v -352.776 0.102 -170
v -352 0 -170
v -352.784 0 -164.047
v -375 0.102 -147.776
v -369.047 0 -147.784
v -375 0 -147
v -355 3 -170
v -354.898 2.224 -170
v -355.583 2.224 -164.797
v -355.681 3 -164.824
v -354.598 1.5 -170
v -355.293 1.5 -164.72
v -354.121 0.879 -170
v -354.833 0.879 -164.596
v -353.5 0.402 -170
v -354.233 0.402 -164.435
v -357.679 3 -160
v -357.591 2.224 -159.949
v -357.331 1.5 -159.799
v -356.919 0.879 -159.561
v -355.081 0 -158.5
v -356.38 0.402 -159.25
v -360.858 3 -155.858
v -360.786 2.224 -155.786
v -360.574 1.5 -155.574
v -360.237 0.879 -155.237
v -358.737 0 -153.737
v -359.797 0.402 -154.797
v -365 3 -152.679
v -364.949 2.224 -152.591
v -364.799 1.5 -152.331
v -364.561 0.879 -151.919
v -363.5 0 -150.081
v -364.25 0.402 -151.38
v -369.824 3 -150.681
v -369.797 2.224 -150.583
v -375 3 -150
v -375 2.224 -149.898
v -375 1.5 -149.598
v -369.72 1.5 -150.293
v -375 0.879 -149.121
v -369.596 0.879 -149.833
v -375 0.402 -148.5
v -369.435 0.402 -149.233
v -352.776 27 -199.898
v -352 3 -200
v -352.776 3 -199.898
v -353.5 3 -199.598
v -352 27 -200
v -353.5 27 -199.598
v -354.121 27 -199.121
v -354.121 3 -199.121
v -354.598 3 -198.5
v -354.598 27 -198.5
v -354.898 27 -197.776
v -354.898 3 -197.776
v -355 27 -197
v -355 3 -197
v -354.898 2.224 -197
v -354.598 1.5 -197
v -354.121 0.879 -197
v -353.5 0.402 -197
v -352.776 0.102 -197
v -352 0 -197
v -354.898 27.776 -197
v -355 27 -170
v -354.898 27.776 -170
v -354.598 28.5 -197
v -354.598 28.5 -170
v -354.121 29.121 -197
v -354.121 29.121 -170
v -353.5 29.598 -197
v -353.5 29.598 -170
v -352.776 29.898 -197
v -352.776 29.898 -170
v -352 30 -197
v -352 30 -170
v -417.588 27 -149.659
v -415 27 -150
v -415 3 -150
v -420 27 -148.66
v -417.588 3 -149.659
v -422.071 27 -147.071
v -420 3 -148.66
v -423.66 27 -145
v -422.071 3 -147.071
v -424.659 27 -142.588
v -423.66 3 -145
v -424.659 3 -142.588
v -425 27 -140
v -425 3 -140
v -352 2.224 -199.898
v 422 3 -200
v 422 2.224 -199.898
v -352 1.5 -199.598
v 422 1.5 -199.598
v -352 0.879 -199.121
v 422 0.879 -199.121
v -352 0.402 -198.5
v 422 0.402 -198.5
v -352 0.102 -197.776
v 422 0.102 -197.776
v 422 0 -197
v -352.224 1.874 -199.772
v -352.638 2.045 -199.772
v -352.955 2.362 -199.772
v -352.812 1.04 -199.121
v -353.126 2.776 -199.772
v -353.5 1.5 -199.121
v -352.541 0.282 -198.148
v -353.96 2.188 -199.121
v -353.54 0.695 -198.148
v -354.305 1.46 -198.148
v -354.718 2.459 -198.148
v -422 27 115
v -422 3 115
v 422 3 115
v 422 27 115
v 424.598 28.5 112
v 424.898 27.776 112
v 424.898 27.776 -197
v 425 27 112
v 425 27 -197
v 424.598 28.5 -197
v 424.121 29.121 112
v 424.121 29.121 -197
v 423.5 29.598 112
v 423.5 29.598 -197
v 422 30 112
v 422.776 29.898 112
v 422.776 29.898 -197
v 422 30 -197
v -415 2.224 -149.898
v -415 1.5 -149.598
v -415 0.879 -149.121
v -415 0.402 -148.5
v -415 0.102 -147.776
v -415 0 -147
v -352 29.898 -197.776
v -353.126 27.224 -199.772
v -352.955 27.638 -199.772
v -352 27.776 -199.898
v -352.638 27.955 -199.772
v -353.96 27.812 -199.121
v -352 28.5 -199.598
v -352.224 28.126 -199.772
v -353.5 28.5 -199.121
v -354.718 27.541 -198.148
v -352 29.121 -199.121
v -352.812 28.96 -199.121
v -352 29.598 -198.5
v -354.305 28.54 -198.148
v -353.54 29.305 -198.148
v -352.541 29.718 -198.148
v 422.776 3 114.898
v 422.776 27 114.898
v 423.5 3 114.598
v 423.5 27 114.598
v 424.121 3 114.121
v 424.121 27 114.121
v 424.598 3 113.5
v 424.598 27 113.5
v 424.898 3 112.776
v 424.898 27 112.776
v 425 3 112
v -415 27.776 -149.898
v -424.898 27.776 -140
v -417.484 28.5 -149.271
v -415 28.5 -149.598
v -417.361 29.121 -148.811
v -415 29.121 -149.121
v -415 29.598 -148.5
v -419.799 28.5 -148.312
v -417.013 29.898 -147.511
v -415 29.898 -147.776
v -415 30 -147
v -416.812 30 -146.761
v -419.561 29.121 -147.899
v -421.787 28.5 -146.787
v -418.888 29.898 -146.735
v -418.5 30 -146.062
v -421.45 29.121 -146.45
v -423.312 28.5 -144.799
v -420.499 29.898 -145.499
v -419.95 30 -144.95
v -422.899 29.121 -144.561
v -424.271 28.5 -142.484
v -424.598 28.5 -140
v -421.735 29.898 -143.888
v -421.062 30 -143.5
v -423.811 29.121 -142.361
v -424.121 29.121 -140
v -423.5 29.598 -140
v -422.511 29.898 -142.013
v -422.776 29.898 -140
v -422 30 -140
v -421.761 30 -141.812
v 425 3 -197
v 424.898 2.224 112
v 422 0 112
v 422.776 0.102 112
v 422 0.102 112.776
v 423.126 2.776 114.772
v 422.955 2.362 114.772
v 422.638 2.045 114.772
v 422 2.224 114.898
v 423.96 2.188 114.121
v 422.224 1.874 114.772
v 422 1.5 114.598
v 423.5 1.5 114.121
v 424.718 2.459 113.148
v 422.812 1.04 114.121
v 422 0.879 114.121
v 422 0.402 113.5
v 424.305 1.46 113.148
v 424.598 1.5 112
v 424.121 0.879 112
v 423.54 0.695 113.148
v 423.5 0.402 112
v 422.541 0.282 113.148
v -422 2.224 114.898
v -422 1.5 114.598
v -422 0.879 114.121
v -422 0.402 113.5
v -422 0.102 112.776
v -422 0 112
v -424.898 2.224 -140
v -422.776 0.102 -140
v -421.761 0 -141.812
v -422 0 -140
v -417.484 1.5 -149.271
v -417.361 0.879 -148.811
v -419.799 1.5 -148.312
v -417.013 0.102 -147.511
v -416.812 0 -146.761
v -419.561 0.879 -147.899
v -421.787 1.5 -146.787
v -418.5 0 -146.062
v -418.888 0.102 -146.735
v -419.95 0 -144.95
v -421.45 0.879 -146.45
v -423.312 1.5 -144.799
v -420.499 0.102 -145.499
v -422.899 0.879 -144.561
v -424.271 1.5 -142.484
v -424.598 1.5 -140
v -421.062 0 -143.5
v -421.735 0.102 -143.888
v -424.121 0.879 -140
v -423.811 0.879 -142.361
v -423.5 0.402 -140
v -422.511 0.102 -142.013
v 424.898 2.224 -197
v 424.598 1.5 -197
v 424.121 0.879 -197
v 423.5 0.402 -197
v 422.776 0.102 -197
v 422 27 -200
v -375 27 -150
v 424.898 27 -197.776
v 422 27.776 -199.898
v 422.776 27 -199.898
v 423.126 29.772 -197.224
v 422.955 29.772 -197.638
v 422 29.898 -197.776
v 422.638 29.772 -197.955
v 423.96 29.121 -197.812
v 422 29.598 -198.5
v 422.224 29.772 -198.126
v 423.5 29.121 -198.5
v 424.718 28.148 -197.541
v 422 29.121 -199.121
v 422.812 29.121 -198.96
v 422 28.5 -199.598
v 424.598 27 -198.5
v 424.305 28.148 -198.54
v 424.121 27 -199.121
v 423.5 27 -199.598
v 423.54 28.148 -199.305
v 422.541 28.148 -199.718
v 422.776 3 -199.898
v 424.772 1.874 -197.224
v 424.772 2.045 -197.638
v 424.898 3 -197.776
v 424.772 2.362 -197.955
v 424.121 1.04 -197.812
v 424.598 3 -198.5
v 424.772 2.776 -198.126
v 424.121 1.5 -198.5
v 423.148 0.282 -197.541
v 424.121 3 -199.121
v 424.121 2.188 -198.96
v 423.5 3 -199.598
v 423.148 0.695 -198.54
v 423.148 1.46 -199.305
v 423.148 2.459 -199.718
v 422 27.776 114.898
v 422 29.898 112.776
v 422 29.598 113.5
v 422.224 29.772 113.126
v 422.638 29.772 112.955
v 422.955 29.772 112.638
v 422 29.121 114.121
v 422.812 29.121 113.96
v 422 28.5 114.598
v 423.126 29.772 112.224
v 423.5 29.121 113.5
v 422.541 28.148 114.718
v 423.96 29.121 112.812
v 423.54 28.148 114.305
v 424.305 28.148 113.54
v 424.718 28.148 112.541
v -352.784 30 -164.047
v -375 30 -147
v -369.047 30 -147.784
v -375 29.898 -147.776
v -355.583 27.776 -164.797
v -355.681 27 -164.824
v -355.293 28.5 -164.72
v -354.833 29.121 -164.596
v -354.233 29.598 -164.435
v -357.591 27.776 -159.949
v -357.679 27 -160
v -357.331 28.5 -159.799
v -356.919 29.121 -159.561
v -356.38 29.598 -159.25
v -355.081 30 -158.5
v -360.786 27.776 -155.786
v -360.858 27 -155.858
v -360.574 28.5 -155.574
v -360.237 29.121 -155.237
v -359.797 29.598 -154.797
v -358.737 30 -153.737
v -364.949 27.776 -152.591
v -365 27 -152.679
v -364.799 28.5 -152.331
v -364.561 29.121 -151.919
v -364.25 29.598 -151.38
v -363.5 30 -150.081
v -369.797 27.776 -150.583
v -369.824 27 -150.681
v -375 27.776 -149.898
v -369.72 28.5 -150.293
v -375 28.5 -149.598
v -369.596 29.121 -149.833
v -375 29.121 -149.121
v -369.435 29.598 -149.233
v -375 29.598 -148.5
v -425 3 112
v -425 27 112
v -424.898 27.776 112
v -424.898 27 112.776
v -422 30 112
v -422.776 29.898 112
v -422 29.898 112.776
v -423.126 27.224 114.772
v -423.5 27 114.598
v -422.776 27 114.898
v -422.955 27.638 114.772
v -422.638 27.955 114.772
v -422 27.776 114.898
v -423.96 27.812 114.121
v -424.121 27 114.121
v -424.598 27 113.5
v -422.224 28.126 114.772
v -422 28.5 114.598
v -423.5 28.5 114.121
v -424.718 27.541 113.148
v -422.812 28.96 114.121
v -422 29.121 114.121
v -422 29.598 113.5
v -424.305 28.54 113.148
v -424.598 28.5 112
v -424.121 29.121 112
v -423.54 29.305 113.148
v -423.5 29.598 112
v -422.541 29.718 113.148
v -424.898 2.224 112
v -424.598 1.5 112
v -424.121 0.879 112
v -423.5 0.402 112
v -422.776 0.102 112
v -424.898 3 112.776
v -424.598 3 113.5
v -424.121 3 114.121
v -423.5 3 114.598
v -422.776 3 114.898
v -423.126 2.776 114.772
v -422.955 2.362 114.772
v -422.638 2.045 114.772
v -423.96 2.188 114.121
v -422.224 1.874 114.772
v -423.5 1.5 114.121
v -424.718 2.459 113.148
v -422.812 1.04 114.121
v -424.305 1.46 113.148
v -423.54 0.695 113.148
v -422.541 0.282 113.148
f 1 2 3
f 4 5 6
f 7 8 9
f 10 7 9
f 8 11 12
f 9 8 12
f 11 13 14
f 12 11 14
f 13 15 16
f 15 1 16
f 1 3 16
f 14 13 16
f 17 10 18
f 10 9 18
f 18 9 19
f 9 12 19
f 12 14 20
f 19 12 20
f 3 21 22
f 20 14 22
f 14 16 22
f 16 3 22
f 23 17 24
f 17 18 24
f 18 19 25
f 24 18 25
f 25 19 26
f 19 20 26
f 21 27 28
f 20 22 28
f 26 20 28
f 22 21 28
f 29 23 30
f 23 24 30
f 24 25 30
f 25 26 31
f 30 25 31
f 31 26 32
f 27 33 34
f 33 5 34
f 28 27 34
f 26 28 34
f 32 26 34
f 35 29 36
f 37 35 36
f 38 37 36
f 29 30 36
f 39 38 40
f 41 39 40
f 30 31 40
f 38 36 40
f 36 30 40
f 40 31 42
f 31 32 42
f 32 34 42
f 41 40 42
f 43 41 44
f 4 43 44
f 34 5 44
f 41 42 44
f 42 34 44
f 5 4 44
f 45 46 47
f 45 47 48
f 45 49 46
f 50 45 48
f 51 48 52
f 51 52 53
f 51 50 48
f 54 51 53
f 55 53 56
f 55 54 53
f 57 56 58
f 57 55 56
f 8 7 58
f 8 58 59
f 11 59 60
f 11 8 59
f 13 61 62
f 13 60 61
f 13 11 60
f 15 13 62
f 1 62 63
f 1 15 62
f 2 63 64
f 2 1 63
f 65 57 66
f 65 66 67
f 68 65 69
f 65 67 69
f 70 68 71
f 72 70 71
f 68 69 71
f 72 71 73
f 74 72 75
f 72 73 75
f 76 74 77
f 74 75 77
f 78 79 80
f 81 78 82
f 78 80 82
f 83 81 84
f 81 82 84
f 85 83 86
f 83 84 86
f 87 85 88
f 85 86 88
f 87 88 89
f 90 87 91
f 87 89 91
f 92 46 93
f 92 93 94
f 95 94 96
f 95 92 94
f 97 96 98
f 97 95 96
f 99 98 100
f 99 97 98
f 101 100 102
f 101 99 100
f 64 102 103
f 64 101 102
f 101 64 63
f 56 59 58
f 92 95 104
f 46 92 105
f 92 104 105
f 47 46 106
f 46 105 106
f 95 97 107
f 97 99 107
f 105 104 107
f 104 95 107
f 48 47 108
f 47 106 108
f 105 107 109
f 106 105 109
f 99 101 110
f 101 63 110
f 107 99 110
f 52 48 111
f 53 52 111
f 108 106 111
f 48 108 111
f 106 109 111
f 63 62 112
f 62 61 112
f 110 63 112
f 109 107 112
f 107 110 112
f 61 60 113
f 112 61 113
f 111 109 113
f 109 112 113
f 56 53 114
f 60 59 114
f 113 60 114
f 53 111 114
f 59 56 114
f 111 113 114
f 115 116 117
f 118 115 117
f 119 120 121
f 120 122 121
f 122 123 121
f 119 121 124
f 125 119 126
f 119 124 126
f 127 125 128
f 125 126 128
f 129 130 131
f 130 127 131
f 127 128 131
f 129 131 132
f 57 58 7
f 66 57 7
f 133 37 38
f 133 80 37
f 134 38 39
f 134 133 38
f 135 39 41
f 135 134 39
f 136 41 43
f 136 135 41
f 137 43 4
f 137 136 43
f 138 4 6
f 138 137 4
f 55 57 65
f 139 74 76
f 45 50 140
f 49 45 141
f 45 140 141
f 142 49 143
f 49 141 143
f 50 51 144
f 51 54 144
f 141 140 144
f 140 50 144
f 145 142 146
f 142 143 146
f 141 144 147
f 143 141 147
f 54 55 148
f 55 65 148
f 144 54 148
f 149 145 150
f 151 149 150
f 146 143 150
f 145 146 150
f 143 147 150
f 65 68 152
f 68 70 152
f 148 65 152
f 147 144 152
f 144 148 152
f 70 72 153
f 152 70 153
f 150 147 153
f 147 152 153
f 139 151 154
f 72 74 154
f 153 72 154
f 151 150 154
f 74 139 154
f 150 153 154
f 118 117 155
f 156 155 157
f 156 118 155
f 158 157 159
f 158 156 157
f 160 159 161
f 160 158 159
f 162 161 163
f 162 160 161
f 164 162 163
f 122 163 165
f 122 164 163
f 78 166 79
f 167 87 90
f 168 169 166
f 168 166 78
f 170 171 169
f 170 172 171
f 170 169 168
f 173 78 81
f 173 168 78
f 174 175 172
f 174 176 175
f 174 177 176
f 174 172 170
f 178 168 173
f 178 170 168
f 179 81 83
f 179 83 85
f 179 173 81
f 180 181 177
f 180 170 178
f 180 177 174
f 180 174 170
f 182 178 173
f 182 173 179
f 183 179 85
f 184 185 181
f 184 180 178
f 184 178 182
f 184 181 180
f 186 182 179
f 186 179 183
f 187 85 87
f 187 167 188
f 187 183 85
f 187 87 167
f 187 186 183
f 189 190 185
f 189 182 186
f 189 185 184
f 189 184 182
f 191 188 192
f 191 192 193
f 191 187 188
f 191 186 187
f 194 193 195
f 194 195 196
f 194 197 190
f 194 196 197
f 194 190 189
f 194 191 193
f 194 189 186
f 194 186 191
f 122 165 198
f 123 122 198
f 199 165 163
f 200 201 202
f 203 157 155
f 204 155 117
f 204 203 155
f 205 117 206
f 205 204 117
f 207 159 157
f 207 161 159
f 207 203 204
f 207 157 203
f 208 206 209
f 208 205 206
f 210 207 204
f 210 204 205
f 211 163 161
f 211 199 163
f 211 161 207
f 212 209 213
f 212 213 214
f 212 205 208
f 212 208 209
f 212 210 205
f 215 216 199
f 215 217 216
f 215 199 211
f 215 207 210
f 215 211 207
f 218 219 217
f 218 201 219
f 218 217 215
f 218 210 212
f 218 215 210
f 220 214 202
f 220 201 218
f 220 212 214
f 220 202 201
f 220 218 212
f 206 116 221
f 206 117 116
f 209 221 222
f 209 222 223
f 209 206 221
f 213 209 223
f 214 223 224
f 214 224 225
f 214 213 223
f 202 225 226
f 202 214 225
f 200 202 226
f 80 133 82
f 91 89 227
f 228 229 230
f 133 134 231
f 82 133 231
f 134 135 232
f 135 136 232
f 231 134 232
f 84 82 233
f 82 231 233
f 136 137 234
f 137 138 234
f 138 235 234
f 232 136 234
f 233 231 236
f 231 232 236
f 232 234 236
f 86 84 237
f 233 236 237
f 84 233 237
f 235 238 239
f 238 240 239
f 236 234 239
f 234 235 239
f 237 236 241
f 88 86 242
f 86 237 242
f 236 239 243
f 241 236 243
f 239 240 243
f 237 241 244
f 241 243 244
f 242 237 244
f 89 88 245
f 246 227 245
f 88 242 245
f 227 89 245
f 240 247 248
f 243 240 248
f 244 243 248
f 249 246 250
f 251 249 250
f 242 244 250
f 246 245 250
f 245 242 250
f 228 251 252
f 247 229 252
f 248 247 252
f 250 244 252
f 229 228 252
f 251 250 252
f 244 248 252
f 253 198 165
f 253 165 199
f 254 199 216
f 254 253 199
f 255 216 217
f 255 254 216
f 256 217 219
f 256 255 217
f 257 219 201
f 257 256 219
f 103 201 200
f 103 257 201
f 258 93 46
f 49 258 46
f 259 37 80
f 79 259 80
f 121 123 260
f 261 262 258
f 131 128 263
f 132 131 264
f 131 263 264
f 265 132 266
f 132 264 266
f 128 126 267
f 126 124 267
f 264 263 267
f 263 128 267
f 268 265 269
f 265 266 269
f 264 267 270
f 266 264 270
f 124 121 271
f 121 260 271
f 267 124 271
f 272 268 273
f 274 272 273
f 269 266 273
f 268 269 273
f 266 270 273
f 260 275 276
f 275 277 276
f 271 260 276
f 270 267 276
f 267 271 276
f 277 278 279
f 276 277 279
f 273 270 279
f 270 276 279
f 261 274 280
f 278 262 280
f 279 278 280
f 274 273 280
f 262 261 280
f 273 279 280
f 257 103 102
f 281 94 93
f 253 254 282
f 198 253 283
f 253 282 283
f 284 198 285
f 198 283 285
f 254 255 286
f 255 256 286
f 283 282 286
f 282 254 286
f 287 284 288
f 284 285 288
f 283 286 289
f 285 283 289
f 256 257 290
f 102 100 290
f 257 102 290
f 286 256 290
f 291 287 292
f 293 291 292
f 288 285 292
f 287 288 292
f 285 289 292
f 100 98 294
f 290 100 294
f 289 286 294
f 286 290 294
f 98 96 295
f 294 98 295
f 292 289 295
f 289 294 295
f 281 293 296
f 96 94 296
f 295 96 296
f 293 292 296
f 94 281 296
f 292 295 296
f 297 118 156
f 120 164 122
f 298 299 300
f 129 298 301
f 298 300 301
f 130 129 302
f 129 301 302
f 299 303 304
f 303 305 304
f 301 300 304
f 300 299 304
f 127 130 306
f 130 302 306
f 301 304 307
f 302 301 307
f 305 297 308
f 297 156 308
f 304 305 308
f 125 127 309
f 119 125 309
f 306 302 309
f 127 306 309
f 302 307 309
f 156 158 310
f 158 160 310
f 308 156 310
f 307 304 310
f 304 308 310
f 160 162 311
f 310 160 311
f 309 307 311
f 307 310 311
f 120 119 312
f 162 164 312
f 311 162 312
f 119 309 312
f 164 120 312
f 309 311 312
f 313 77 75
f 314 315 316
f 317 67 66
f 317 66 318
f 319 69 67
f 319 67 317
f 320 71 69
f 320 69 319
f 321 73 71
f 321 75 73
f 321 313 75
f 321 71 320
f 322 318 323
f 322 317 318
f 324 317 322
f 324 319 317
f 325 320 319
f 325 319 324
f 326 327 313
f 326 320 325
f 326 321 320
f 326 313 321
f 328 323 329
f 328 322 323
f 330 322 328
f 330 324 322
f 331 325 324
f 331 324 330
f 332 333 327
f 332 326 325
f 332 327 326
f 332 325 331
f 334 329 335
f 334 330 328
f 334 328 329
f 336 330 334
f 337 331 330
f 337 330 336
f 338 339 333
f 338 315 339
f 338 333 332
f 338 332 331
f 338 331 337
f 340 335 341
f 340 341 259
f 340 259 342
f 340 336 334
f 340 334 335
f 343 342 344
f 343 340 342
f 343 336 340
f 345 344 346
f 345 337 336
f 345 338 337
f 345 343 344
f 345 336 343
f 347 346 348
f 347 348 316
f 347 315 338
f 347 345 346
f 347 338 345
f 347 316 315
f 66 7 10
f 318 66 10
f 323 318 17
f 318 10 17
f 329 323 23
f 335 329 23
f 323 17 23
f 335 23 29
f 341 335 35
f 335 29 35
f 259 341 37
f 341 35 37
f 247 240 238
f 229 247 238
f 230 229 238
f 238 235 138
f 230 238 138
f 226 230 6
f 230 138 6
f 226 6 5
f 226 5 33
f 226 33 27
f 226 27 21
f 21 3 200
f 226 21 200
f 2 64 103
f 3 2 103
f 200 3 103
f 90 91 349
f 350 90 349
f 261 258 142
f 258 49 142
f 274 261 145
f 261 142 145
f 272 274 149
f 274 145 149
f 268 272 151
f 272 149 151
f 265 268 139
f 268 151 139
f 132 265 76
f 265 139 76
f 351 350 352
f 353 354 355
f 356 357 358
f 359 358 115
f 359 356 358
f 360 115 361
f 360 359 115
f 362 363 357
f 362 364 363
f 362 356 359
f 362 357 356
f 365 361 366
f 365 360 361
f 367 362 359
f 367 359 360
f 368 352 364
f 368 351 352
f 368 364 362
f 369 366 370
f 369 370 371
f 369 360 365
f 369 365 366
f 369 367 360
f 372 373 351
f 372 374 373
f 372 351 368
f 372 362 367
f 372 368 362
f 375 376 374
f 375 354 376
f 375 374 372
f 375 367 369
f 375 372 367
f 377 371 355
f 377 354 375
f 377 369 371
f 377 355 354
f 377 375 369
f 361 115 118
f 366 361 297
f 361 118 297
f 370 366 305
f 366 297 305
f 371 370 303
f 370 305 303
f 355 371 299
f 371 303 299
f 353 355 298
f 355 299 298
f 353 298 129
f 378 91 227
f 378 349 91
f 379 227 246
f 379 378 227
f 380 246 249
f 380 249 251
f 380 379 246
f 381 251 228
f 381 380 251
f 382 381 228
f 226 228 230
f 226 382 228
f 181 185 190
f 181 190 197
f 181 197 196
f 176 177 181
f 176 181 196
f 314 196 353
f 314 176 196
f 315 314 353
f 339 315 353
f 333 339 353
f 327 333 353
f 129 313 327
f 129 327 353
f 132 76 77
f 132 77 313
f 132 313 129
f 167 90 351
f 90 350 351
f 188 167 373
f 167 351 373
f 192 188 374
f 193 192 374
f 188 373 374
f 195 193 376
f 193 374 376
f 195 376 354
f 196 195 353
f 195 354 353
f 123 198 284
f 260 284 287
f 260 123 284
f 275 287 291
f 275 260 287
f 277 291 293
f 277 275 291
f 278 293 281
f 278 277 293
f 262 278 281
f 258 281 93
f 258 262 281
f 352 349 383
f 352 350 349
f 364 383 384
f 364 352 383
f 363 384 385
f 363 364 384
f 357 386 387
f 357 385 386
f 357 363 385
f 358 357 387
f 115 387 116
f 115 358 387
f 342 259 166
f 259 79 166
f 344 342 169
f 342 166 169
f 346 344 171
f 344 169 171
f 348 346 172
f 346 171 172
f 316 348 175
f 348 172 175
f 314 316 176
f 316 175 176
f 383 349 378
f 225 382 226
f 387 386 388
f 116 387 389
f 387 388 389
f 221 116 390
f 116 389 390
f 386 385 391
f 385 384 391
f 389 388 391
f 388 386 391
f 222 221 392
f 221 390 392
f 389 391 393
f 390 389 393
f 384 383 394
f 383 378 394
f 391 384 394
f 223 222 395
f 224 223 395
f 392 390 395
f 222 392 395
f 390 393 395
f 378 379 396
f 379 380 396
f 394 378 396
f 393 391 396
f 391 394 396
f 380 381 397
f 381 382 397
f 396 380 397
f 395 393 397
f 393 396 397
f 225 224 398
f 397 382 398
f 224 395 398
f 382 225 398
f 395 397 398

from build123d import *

# Parameters (mm, degrees)
EXTRUDE_1_DEPTH = 30
FILLET_2_R      = 3


with BuildPart() as part:
    # 草图1 → 凸台-拉伸1 (new body)
    with BuildSketch(Plane(origin=(0, 0, 0), x_dir=(1, 0, 0), z_dir=(0, 1, 0))):
        with BuildLine():
            Line((-425, 140), (-425, -115))
            Line((-425, -115), (425, -115))
            Line((425, -115), (425, 200))
            Line((425, 200), (-355, 200))
            Line((-355, 200), (-355, 170))
            ThreePointArc((-355, 170), (-360.857864376, 155.857864376), (-375, 150))
            Line((-375, 150), (-415, 150))
            ThreePointArc((-415, 150), (-422.071067812, 147.071067812), (-425, 140))
        make_face()
    extrude(amount=EXTRUDE_1_DEPTH)

    # 圆角2
    fillet_2_edges = [part.edges().sort_by_distance(p)[0] for p in [
        (-360.857864376, 0, -155.857864376),
        (-355, 0, -185),
        (35, 0, -200),
        (425, 0, -42.5),
        (-355, 30, -185),
        (425, 15, 115),
        (-425, 15, 115),
        (-355, 15, -200),
        (425, 15, -200),
        (-360.857864376, 30, -155.857864376),
        (-395, 30, -150),
        (-422.071067812, 30, -147.071067812),
        (-425, 30, -12.5),
        (0, 30, 115),
        (425, 30, -42.5),
        (0, 0, 115),
        (35, 30, -200),
        (-425, 0, -12.5),
        (-422.071067812, 0, -147.071067812),
        (-395, 0, -150),
    ]]
    fillet(fillet_2_edges, radius=FILLET_2_R)


solid = part.part
